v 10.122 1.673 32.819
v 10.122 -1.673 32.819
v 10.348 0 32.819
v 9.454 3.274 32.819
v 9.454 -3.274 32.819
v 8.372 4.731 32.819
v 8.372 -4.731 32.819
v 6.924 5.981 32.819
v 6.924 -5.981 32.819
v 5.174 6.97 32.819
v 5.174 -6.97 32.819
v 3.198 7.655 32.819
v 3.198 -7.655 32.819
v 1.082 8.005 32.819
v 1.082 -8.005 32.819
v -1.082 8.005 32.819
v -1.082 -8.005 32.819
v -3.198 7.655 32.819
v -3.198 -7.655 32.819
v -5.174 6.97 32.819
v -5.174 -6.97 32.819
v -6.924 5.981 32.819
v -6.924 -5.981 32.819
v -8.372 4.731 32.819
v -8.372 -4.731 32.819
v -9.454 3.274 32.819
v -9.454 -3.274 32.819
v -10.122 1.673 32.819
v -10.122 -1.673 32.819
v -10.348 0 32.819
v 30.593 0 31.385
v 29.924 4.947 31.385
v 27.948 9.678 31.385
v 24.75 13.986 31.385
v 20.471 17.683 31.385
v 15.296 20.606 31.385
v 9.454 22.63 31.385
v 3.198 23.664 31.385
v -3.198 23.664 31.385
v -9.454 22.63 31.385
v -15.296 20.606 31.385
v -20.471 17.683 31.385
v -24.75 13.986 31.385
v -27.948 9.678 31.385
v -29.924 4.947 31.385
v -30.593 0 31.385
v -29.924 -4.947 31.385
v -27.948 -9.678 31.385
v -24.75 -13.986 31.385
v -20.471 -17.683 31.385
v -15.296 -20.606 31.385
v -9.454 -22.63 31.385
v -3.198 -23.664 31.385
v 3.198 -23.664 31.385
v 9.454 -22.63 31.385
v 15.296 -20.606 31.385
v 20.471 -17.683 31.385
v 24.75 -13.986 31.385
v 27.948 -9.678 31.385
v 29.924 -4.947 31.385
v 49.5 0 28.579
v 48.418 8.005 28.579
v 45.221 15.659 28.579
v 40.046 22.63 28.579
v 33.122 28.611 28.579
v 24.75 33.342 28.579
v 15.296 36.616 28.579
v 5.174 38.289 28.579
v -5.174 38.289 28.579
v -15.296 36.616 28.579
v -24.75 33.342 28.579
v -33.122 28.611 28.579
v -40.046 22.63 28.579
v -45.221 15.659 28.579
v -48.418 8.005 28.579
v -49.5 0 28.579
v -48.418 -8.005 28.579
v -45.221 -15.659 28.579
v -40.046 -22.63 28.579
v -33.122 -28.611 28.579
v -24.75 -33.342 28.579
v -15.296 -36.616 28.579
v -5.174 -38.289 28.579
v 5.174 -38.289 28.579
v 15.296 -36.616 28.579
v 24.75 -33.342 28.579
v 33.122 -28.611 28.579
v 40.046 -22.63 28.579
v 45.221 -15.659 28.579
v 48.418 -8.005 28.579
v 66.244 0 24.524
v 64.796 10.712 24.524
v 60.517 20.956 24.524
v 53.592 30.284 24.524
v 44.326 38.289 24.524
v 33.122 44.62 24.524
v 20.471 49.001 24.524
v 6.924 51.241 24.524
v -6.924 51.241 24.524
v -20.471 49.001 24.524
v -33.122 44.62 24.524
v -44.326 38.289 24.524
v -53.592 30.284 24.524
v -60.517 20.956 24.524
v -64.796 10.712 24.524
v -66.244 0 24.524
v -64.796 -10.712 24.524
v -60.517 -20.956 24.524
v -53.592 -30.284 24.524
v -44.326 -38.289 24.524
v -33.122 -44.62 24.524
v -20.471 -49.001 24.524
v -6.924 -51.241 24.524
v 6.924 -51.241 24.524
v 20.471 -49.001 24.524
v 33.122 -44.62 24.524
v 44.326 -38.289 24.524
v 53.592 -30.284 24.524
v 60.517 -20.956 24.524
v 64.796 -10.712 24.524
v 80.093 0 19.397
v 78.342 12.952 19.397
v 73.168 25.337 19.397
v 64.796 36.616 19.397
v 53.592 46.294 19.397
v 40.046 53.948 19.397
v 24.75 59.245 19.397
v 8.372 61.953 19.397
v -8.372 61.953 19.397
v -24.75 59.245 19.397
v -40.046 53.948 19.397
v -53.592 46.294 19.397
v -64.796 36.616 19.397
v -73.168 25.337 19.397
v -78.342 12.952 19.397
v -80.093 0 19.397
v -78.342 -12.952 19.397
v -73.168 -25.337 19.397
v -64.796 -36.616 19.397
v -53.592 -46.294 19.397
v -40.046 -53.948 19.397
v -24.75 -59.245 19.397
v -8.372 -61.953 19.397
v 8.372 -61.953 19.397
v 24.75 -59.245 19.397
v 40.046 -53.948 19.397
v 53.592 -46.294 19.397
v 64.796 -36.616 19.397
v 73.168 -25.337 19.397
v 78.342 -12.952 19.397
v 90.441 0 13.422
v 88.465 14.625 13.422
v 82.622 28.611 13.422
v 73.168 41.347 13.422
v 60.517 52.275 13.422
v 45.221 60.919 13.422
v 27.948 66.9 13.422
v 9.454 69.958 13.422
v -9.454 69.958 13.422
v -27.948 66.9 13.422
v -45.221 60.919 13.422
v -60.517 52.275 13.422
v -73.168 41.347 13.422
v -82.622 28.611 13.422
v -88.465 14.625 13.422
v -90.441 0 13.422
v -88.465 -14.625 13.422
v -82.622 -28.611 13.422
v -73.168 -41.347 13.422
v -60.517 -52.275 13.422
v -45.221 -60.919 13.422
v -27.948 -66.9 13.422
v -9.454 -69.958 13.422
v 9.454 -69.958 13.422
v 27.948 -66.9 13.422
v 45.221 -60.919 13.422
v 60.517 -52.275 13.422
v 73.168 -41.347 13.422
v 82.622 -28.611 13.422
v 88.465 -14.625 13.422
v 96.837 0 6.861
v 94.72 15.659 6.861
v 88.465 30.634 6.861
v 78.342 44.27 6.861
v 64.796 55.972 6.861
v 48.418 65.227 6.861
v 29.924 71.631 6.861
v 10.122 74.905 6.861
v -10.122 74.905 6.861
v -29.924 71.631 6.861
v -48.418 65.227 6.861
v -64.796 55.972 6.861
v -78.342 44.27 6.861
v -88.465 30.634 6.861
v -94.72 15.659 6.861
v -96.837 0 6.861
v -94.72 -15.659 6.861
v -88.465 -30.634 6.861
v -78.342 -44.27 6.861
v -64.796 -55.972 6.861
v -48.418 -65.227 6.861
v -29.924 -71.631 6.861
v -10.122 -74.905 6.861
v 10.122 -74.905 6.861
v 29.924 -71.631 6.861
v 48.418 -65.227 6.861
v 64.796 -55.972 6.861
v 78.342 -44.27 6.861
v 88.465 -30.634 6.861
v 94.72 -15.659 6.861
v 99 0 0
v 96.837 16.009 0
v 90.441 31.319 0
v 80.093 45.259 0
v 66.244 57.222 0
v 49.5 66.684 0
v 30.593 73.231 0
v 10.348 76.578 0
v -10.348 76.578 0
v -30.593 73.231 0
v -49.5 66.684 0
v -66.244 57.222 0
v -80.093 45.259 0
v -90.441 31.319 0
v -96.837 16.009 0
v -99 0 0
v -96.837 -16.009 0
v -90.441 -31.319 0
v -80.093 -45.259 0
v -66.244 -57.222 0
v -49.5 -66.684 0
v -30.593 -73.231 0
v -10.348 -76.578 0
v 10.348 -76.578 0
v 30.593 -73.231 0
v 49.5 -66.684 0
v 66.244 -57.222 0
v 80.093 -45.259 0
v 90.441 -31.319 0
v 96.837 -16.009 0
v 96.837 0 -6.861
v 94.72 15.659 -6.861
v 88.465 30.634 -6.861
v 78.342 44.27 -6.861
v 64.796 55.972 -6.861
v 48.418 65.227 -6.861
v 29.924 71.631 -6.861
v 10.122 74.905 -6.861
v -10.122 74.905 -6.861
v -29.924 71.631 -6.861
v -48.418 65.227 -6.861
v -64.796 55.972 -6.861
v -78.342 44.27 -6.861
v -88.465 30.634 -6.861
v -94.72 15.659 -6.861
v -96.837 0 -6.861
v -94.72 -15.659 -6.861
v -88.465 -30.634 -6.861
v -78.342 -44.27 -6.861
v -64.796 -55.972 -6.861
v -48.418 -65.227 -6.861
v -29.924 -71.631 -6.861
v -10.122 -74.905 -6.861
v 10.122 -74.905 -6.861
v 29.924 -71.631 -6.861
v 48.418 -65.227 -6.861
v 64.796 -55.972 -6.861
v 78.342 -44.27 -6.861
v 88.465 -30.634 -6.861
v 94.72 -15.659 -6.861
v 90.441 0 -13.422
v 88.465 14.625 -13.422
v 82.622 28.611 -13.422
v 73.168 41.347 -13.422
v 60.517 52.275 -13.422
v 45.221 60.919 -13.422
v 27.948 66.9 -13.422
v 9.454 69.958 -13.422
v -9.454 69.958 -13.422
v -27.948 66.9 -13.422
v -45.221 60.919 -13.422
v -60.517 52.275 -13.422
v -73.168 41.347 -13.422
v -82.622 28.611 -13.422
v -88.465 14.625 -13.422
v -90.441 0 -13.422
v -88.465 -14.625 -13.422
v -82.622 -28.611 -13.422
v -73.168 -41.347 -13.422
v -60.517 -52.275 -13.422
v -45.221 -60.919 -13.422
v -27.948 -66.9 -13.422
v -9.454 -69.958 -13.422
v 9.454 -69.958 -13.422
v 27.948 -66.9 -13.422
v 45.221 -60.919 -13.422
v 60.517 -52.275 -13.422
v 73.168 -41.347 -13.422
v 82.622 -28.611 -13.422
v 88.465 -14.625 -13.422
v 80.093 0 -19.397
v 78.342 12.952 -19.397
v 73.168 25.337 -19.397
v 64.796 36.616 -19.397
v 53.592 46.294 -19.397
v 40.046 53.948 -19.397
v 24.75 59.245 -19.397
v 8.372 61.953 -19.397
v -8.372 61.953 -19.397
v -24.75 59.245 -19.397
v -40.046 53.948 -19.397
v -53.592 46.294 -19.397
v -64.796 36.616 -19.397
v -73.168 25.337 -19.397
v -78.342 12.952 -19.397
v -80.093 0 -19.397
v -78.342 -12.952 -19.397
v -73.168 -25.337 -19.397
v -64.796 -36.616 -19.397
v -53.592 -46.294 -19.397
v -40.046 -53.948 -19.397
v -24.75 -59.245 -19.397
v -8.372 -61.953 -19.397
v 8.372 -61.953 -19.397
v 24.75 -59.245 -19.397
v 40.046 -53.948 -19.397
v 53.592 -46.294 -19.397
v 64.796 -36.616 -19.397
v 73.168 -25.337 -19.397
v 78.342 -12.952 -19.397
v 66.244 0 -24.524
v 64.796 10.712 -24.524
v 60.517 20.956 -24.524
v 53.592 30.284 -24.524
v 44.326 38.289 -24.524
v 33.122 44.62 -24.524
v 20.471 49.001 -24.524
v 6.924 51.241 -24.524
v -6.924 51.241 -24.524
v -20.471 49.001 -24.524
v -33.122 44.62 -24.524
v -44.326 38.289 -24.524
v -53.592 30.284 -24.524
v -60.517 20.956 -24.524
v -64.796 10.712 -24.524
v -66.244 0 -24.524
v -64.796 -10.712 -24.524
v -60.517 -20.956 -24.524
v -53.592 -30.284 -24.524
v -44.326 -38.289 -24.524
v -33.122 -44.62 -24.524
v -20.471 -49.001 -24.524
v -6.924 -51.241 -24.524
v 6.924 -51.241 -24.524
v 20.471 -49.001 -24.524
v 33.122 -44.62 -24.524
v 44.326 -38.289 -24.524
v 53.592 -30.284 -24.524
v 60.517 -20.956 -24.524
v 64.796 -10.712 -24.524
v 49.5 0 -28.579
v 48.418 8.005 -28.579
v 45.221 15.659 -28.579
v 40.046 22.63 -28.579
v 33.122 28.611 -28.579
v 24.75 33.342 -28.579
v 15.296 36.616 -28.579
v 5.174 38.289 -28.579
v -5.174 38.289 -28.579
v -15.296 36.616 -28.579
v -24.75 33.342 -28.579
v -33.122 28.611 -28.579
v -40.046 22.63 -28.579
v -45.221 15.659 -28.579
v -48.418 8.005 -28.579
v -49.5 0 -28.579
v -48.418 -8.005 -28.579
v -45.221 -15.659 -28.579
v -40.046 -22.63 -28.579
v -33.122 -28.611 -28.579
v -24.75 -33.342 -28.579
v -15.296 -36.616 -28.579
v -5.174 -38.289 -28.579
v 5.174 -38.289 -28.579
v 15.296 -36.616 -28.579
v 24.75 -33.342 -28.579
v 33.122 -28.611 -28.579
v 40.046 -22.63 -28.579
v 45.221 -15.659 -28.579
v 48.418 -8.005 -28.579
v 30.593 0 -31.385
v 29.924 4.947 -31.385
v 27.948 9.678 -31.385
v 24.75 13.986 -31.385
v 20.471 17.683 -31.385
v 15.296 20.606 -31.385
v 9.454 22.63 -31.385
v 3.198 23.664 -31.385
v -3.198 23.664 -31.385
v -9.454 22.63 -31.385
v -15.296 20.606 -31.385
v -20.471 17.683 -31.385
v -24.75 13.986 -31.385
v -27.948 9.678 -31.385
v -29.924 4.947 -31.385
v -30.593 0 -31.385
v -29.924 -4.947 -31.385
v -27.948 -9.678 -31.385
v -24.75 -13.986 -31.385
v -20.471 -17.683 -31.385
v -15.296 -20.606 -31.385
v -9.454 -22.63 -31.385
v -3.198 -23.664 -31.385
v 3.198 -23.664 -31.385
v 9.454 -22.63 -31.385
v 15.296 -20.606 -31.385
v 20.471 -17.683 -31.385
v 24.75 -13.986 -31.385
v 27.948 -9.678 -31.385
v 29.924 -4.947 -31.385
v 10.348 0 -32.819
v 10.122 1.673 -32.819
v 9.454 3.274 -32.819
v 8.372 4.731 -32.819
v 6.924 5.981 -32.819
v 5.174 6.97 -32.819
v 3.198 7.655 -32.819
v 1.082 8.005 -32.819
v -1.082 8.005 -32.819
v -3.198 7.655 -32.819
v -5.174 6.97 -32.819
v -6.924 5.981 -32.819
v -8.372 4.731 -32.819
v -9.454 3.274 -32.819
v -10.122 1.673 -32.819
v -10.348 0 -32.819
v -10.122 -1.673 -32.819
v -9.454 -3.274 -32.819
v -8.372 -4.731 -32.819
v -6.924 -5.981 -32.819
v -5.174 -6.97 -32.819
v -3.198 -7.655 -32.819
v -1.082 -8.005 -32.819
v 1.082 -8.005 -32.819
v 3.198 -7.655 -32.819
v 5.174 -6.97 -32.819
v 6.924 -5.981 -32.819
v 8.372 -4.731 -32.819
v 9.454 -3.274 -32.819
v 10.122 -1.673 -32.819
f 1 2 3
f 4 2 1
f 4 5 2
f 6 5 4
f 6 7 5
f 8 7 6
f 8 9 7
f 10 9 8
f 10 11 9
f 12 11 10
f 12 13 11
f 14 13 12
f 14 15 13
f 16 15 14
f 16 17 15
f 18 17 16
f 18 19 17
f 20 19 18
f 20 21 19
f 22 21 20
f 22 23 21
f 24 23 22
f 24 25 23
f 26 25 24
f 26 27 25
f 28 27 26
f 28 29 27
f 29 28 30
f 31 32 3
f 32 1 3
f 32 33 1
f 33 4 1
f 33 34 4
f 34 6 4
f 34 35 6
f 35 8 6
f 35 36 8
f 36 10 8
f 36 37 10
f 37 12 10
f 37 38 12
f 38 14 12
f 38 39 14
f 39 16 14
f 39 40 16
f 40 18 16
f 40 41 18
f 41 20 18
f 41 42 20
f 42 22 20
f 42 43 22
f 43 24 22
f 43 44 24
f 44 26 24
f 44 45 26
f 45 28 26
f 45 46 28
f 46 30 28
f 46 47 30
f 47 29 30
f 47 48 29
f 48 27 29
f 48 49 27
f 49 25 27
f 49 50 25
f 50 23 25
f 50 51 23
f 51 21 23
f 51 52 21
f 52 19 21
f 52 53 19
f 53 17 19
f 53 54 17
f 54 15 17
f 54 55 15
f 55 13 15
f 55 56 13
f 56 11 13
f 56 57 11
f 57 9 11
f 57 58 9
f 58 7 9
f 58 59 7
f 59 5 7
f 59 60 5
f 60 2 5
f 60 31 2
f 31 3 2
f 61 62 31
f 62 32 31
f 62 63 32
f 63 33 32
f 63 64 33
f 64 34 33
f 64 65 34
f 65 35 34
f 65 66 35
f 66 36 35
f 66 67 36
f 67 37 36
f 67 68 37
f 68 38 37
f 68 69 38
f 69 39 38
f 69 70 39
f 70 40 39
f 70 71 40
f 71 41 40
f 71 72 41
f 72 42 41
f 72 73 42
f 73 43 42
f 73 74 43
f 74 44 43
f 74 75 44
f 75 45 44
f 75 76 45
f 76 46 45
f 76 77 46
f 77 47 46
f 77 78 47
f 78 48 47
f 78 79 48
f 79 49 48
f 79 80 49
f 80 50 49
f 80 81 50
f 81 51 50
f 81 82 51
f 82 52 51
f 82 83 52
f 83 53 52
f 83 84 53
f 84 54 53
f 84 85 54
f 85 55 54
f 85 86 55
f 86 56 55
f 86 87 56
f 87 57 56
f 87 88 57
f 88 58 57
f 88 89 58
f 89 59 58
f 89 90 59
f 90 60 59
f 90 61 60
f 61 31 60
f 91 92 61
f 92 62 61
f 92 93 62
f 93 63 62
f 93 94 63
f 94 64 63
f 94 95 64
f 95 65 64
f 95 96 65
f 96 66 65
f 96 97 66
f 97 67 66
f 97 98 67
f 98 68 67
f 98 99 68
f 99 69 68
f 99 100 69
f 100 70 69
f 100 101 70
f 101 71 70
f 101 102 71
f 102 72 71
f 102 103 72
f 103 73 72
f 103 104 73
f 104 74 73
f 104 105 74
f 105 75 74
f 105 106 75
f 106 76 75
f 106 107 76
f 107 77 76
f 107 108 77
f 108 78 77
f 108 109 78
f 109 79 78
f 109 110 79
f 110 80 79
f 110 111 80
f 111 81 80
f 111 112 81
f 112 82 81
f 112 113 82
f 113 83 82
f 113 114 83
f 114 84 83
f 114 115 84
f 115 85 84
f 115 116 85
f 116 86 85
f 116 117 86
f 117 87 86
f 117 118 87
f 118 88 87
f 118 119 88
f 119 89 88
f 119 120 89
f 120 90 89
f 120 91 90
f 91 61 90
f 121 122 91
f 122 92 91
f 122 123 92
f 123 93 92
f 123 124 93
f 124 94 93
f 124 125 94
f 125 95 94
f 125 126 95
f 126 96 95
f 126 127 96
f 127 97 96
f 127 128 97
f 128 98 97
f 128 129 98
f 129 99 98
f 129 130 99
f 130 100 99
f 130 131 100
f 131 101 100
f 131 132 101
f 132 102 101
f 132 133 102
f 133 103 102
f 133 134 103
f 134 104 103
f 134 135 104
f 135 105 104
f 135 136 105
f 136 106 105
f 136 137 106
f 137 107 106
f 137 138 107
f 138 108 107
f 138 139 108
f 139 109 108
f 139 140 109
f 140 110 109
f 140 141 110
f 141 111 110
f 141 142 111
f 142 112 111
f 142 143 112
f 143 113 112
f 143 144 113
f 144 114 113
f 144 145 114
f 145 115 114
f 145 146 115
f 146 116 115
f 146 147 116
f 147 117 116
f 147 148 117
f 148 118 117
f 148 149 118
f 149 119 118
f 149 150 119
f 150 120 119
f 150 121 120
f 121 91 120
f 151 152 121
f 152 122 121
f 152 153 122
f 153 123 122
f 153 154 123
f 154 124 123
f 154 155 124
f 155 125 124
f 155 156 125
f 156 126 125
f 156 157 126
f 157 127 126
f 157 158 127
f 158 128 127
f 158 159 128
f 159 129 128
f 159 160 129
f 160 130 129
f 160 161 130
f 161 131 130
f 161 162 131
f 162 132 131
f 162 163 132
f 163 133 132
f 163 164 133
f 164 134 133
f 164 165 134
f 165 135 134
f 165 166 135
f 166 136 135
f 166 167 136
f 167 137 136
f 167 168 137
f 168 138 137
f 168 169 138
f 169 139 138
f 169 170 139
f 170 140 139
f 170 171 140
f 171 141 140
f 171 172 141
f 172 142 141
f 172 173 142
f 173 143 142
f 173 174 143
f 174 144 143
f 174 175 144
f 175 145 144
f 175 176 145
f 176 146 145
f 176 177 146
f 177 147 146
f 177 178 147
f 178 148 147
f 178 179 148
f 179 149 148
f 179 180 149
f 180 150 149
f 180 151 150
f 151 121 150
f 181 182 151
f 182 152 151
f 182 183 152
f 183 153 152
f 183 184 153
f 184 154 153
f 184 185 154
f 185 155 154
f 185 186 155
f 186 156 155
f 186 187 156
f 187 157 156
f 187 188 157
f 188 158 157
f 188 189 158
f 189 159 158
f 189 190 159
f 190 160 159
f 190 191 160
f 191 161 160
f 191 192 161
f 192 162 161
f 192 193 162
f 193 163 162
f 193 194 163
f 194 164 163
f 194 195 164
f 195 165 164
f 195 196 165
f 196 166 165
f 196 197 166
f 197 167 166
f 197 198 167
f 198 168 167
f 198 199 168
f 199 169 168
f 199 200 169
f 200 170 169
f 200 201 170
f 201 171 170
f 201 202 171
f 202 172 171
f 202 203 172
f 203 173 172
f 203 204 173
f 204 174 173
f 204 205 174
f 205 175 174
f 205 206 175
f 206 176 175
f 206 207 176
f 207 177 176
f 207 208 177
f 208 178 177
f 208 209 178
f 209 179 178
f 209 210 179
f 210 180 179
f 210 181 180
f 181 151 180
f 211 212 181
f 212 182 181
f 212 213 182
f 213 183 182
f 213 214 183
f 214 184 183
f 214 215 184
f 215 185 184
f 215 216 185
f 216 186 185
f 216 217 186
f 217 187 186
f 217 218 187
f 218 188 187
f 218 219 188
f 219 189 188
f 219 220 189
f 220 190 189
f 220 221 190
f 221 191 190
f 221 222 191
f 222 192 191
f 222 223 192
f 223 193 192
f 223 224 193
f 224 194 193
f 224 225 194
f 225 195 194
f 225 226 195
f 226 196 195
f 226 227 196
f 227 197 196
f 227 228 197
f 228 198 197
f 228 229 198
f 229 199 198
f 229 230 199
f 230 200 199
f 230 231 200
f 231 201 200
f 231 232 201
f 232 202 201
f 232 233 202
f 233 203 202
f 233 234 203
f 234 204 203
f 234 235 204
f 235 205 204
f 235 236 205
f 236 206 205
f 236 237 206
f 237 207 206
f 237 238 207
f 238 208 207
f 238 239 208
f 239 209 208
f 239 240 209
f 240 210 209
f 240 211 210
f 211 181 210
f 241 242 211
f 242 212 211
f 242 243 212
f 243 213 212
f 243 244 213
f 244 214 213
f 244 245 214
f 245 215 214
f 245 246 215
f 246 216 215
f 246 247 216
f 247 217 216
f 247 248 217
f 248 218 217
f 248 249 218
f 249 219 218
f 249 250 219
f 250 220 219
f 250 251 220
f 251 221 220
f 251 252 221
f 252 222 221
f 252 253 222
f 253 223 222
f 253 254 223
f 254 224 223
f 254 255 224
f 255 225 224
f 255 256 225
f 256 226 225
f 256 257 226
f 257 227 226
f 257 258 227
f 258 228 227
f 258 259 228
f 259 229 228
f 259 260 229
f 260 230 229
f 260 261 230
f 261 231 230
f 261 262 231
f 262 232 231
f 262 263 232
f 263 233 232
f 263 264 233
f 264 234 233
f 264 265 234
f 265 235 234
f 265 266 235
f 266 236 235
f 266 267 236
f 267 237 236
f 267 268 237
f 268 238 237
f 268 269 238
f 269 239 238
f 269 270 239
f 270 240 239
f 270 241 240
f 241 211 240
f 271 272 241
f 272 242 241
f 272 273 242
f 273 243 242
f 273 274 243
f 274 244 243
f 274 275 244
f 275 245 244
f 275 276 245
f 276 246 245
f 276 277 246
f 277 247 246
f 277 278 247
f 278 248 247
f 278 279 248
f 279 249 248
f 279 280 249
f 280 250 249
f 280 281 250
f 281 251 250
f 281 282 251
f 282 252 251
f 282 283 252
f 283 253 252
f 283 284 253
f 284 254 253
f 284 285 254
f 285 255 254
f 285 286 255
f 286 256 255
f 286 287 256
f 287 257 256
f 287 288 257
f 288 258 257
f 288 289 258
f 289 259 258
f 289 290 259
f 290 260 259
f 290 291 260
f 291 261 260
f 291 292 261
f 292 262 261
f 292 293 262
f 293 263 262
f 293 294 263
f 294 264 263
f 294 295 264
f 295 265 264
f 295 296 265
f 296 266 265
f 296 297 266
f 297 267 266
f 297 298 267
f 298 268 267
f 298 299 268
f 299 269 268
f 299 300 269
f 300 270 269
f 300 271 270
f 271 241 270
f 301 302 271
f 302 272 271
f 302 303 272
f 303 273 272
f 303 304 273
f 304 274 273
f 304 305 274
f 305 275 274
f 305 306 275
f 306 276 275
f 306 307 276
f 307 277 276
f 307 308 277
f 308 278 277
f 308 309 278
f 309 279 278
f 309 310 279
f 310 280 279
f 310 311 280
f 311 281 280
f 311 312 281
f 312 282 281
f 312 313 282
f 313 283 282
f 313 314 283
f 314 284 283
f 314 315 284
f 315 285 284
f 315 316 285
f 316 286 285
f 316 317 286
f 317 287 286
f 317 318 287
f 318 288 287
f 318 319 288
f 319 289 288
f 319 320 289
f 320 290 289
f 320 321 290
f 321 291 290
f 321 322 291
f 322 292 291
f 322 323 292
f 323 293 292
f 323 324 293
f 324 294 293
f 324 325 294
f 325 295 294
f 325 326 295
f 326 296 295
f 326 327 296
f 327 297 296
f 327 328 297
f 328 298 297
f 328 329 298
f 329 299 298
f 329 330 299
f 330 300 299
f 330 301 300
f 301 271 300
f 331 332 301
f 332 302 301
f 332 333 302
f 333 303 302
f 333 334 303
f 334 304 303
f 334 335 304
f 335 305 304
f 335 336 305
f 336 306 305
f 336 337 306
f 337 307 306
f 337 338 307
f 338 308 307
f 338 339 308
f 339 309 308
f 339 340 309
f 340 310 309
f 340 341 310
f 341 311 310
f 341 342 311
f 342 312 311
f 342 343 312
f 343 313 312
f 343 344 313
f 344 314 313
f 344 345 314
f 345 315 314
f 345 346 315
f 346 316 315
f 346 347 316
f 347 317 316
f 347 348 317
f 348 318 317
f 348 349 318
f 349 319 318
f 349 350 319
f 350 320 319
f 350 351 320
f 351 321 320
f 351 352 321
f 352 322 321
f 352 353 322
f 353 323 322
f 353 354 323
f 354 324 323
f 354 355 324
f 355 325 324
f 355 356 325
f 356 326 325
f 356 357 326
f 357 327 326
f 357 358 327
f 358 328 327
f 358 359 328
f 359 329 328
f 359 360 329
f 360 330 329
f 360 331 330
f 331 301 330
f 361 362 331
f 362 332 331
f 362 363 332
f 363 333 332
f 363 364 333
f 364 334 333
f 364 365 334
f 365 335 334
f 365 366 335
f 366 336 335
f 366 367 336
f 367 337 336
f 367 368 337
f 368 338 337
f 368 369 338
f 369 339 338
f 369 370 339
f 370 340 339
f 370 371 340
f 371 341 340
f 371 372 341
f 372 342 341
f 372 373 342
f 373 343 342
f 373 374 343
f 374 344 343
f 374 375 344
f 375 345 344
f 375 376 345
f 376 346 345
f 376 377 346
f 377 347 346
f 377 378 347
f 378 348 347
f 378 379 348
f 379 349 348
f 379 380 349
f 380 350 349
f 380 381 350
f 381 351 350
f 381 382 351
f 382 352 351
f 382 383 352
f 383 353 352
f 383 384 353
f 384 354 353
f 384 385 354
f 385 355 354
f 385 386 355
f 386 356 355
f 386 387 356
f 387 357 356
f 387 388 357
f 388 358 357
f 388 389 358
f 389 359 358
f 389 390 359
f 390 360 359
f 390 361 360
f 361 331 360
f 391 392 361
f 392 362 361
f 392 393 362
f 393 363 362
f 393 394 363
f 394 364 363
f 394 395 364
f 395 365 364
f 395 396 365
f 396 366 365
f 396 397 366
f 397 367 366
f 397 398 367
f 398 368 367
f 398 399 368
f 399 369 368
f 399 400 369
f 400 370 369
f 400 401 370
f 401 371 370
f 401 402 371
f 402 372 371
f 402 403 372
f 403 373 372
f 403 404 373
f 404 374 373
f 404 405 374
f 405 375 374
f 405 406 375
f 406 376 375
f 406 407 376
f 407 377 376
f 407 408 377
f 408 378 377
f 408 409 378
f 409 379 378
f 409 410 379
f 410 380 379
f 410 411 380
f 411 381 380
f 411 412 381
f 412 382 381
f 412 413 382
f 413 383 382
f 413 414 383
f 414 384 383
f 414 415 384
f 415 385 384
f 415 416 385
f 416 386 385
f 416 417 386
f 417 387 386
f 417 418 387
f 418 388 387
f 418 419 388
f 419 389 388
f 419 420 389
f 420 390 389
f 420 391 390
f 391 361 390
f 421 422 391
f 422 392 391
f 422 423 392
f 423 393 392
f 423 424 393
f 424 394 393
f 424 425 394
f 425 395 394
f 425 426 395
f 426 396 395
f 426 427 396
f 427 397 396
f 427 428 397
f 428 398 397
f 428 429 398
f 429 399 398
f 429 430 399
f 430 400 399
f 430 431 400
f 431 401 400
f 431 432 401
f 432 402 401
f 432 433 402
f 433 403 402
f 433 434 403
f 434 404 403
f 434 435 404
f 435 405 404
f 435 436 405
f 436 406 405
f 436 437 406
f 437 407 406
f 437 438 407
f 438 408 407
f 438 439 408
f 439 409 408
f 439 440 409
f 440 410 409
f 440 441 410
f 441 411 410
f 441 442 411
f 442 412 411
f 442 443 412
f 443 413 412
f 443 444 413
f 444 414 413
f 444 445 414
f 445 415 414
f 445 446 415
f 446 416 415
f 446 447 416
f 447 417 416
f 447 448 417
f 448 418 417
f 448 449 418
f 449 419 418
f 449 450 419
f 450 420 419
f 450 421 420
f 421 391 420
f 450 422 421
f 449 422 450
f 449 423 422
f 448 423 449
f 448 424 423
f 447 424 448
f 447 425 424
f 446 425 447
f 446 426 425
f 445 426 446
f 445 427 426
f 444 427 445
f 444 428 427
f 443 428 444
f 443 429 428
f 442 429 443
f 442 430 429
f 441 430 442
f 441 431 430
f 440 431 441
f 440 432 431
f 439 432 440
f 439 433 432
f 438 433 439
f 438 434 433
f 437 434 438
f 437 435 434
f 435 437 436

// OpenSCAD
// Generated by SolidPython 1.0.1 on 2020-07-29 00:46:48


scale(v = [9, 7, 3]) {
	sphere(r = 11);
}
/***********************************************
*********      SolidPython code:      **********
************************************************
 
# import packages: SolidPython
from solid import *
from solid.utils import *
from itertools import chain, combinations, permutations


class Resize:

    def __init__(self, scad_file):
        self.scad_file = scad_file
        #self.scad_file = import_scad(scad_file)
        # cone/cylinder param:
        self.r1 = 0
        self.r2 = 0
        self.h = 0
        # rectangular prism param:
        self.w = 0
        self.l = 0
        # ellipse param:
        self.r = 0

    # import OpenScad code (file name corresponds to shape)


    # classify shape + parameters
    def assign(self, param1, param2, param3):
        if self.scad_file == 'cone.scad':
            self.r1 = param1
            self.r2 = param2
            self.h = param3
        elif self.scad_file == 'cylinder.scad':
            self.r1 = param1
            self.r2 = param2
            self.h = param3
        elif self.scad_file == 'rectangularPrism.scad':
            self.h = param1
            self.l = param2
            self.w = param3
        else:
            self.r = param1
            self.h = param2

    # resize parameters
    def iterate(self):
        x = range(3, 20, 2)
        i = 1
        if self.scad_file == 'cone.scad':
            tempList = list(permutations(x, 2))
            for temp in tempList:
                param1 = temp[0]
                param2 = temp[1]
                filepath = 'produced_scad_files/' + 'cone' + str(param1) + '_' + str(param2) + '_' + '.scad'
                scad_render_to_file(cylinder(h=param1, r1=param2, r2=0), filepath)

        elif self.scad_file == 'cylinder.scad':
            tempList = list(permutations(x, 3))
            for temp in tempList:
                param1 = temp[0]
                param2 = temp[1]
                filepath = 'produced_scad_files/' + 'cylinder' + str(param1) + '_' + str(param2) + '_' + '.scad'
                scad_render_to_file(cylinder(h=param1, r1=param2, r2=param2), filepath)

        elif self.scad_file == 'rectangularPrism.scad':
            tempList = list(permutations(x, 3))
            for temp in tempList:
                param1 = temp[0]
                param2 = temp[1]
                param3 = temp[2]
                filepath = 'produced_scad_files/' + 'rectangularPrism' + str(param1) + '_' + str(param2) + '_' + str(
                    param3) + '.scad'
                scad_render_to_file(cube(size=(param1, param2, param3)), filepath)

        elif self.scad_file == 'ellipse.scad':
            tempList = list(permutations(x, 4))
            for temp in tempList:
                param1 = temp[0]
                param2 = temp[1]
                param3 = temp[2]
                param4 = temp[3]
                filepath = 'produced_scad_files/' + 'ellipse' + str(param1) + '_' + str(param2) + '_' + str(param3) + '_' + str(param4) + '.scad'
                scad_render_to_file(scale([param1, param2, param3])(sphere(r=param4)), filepath)

    def render_to_scadfile(self):
        scad_render_to_file(scad, 'example.scad') 
 
************************************************/
